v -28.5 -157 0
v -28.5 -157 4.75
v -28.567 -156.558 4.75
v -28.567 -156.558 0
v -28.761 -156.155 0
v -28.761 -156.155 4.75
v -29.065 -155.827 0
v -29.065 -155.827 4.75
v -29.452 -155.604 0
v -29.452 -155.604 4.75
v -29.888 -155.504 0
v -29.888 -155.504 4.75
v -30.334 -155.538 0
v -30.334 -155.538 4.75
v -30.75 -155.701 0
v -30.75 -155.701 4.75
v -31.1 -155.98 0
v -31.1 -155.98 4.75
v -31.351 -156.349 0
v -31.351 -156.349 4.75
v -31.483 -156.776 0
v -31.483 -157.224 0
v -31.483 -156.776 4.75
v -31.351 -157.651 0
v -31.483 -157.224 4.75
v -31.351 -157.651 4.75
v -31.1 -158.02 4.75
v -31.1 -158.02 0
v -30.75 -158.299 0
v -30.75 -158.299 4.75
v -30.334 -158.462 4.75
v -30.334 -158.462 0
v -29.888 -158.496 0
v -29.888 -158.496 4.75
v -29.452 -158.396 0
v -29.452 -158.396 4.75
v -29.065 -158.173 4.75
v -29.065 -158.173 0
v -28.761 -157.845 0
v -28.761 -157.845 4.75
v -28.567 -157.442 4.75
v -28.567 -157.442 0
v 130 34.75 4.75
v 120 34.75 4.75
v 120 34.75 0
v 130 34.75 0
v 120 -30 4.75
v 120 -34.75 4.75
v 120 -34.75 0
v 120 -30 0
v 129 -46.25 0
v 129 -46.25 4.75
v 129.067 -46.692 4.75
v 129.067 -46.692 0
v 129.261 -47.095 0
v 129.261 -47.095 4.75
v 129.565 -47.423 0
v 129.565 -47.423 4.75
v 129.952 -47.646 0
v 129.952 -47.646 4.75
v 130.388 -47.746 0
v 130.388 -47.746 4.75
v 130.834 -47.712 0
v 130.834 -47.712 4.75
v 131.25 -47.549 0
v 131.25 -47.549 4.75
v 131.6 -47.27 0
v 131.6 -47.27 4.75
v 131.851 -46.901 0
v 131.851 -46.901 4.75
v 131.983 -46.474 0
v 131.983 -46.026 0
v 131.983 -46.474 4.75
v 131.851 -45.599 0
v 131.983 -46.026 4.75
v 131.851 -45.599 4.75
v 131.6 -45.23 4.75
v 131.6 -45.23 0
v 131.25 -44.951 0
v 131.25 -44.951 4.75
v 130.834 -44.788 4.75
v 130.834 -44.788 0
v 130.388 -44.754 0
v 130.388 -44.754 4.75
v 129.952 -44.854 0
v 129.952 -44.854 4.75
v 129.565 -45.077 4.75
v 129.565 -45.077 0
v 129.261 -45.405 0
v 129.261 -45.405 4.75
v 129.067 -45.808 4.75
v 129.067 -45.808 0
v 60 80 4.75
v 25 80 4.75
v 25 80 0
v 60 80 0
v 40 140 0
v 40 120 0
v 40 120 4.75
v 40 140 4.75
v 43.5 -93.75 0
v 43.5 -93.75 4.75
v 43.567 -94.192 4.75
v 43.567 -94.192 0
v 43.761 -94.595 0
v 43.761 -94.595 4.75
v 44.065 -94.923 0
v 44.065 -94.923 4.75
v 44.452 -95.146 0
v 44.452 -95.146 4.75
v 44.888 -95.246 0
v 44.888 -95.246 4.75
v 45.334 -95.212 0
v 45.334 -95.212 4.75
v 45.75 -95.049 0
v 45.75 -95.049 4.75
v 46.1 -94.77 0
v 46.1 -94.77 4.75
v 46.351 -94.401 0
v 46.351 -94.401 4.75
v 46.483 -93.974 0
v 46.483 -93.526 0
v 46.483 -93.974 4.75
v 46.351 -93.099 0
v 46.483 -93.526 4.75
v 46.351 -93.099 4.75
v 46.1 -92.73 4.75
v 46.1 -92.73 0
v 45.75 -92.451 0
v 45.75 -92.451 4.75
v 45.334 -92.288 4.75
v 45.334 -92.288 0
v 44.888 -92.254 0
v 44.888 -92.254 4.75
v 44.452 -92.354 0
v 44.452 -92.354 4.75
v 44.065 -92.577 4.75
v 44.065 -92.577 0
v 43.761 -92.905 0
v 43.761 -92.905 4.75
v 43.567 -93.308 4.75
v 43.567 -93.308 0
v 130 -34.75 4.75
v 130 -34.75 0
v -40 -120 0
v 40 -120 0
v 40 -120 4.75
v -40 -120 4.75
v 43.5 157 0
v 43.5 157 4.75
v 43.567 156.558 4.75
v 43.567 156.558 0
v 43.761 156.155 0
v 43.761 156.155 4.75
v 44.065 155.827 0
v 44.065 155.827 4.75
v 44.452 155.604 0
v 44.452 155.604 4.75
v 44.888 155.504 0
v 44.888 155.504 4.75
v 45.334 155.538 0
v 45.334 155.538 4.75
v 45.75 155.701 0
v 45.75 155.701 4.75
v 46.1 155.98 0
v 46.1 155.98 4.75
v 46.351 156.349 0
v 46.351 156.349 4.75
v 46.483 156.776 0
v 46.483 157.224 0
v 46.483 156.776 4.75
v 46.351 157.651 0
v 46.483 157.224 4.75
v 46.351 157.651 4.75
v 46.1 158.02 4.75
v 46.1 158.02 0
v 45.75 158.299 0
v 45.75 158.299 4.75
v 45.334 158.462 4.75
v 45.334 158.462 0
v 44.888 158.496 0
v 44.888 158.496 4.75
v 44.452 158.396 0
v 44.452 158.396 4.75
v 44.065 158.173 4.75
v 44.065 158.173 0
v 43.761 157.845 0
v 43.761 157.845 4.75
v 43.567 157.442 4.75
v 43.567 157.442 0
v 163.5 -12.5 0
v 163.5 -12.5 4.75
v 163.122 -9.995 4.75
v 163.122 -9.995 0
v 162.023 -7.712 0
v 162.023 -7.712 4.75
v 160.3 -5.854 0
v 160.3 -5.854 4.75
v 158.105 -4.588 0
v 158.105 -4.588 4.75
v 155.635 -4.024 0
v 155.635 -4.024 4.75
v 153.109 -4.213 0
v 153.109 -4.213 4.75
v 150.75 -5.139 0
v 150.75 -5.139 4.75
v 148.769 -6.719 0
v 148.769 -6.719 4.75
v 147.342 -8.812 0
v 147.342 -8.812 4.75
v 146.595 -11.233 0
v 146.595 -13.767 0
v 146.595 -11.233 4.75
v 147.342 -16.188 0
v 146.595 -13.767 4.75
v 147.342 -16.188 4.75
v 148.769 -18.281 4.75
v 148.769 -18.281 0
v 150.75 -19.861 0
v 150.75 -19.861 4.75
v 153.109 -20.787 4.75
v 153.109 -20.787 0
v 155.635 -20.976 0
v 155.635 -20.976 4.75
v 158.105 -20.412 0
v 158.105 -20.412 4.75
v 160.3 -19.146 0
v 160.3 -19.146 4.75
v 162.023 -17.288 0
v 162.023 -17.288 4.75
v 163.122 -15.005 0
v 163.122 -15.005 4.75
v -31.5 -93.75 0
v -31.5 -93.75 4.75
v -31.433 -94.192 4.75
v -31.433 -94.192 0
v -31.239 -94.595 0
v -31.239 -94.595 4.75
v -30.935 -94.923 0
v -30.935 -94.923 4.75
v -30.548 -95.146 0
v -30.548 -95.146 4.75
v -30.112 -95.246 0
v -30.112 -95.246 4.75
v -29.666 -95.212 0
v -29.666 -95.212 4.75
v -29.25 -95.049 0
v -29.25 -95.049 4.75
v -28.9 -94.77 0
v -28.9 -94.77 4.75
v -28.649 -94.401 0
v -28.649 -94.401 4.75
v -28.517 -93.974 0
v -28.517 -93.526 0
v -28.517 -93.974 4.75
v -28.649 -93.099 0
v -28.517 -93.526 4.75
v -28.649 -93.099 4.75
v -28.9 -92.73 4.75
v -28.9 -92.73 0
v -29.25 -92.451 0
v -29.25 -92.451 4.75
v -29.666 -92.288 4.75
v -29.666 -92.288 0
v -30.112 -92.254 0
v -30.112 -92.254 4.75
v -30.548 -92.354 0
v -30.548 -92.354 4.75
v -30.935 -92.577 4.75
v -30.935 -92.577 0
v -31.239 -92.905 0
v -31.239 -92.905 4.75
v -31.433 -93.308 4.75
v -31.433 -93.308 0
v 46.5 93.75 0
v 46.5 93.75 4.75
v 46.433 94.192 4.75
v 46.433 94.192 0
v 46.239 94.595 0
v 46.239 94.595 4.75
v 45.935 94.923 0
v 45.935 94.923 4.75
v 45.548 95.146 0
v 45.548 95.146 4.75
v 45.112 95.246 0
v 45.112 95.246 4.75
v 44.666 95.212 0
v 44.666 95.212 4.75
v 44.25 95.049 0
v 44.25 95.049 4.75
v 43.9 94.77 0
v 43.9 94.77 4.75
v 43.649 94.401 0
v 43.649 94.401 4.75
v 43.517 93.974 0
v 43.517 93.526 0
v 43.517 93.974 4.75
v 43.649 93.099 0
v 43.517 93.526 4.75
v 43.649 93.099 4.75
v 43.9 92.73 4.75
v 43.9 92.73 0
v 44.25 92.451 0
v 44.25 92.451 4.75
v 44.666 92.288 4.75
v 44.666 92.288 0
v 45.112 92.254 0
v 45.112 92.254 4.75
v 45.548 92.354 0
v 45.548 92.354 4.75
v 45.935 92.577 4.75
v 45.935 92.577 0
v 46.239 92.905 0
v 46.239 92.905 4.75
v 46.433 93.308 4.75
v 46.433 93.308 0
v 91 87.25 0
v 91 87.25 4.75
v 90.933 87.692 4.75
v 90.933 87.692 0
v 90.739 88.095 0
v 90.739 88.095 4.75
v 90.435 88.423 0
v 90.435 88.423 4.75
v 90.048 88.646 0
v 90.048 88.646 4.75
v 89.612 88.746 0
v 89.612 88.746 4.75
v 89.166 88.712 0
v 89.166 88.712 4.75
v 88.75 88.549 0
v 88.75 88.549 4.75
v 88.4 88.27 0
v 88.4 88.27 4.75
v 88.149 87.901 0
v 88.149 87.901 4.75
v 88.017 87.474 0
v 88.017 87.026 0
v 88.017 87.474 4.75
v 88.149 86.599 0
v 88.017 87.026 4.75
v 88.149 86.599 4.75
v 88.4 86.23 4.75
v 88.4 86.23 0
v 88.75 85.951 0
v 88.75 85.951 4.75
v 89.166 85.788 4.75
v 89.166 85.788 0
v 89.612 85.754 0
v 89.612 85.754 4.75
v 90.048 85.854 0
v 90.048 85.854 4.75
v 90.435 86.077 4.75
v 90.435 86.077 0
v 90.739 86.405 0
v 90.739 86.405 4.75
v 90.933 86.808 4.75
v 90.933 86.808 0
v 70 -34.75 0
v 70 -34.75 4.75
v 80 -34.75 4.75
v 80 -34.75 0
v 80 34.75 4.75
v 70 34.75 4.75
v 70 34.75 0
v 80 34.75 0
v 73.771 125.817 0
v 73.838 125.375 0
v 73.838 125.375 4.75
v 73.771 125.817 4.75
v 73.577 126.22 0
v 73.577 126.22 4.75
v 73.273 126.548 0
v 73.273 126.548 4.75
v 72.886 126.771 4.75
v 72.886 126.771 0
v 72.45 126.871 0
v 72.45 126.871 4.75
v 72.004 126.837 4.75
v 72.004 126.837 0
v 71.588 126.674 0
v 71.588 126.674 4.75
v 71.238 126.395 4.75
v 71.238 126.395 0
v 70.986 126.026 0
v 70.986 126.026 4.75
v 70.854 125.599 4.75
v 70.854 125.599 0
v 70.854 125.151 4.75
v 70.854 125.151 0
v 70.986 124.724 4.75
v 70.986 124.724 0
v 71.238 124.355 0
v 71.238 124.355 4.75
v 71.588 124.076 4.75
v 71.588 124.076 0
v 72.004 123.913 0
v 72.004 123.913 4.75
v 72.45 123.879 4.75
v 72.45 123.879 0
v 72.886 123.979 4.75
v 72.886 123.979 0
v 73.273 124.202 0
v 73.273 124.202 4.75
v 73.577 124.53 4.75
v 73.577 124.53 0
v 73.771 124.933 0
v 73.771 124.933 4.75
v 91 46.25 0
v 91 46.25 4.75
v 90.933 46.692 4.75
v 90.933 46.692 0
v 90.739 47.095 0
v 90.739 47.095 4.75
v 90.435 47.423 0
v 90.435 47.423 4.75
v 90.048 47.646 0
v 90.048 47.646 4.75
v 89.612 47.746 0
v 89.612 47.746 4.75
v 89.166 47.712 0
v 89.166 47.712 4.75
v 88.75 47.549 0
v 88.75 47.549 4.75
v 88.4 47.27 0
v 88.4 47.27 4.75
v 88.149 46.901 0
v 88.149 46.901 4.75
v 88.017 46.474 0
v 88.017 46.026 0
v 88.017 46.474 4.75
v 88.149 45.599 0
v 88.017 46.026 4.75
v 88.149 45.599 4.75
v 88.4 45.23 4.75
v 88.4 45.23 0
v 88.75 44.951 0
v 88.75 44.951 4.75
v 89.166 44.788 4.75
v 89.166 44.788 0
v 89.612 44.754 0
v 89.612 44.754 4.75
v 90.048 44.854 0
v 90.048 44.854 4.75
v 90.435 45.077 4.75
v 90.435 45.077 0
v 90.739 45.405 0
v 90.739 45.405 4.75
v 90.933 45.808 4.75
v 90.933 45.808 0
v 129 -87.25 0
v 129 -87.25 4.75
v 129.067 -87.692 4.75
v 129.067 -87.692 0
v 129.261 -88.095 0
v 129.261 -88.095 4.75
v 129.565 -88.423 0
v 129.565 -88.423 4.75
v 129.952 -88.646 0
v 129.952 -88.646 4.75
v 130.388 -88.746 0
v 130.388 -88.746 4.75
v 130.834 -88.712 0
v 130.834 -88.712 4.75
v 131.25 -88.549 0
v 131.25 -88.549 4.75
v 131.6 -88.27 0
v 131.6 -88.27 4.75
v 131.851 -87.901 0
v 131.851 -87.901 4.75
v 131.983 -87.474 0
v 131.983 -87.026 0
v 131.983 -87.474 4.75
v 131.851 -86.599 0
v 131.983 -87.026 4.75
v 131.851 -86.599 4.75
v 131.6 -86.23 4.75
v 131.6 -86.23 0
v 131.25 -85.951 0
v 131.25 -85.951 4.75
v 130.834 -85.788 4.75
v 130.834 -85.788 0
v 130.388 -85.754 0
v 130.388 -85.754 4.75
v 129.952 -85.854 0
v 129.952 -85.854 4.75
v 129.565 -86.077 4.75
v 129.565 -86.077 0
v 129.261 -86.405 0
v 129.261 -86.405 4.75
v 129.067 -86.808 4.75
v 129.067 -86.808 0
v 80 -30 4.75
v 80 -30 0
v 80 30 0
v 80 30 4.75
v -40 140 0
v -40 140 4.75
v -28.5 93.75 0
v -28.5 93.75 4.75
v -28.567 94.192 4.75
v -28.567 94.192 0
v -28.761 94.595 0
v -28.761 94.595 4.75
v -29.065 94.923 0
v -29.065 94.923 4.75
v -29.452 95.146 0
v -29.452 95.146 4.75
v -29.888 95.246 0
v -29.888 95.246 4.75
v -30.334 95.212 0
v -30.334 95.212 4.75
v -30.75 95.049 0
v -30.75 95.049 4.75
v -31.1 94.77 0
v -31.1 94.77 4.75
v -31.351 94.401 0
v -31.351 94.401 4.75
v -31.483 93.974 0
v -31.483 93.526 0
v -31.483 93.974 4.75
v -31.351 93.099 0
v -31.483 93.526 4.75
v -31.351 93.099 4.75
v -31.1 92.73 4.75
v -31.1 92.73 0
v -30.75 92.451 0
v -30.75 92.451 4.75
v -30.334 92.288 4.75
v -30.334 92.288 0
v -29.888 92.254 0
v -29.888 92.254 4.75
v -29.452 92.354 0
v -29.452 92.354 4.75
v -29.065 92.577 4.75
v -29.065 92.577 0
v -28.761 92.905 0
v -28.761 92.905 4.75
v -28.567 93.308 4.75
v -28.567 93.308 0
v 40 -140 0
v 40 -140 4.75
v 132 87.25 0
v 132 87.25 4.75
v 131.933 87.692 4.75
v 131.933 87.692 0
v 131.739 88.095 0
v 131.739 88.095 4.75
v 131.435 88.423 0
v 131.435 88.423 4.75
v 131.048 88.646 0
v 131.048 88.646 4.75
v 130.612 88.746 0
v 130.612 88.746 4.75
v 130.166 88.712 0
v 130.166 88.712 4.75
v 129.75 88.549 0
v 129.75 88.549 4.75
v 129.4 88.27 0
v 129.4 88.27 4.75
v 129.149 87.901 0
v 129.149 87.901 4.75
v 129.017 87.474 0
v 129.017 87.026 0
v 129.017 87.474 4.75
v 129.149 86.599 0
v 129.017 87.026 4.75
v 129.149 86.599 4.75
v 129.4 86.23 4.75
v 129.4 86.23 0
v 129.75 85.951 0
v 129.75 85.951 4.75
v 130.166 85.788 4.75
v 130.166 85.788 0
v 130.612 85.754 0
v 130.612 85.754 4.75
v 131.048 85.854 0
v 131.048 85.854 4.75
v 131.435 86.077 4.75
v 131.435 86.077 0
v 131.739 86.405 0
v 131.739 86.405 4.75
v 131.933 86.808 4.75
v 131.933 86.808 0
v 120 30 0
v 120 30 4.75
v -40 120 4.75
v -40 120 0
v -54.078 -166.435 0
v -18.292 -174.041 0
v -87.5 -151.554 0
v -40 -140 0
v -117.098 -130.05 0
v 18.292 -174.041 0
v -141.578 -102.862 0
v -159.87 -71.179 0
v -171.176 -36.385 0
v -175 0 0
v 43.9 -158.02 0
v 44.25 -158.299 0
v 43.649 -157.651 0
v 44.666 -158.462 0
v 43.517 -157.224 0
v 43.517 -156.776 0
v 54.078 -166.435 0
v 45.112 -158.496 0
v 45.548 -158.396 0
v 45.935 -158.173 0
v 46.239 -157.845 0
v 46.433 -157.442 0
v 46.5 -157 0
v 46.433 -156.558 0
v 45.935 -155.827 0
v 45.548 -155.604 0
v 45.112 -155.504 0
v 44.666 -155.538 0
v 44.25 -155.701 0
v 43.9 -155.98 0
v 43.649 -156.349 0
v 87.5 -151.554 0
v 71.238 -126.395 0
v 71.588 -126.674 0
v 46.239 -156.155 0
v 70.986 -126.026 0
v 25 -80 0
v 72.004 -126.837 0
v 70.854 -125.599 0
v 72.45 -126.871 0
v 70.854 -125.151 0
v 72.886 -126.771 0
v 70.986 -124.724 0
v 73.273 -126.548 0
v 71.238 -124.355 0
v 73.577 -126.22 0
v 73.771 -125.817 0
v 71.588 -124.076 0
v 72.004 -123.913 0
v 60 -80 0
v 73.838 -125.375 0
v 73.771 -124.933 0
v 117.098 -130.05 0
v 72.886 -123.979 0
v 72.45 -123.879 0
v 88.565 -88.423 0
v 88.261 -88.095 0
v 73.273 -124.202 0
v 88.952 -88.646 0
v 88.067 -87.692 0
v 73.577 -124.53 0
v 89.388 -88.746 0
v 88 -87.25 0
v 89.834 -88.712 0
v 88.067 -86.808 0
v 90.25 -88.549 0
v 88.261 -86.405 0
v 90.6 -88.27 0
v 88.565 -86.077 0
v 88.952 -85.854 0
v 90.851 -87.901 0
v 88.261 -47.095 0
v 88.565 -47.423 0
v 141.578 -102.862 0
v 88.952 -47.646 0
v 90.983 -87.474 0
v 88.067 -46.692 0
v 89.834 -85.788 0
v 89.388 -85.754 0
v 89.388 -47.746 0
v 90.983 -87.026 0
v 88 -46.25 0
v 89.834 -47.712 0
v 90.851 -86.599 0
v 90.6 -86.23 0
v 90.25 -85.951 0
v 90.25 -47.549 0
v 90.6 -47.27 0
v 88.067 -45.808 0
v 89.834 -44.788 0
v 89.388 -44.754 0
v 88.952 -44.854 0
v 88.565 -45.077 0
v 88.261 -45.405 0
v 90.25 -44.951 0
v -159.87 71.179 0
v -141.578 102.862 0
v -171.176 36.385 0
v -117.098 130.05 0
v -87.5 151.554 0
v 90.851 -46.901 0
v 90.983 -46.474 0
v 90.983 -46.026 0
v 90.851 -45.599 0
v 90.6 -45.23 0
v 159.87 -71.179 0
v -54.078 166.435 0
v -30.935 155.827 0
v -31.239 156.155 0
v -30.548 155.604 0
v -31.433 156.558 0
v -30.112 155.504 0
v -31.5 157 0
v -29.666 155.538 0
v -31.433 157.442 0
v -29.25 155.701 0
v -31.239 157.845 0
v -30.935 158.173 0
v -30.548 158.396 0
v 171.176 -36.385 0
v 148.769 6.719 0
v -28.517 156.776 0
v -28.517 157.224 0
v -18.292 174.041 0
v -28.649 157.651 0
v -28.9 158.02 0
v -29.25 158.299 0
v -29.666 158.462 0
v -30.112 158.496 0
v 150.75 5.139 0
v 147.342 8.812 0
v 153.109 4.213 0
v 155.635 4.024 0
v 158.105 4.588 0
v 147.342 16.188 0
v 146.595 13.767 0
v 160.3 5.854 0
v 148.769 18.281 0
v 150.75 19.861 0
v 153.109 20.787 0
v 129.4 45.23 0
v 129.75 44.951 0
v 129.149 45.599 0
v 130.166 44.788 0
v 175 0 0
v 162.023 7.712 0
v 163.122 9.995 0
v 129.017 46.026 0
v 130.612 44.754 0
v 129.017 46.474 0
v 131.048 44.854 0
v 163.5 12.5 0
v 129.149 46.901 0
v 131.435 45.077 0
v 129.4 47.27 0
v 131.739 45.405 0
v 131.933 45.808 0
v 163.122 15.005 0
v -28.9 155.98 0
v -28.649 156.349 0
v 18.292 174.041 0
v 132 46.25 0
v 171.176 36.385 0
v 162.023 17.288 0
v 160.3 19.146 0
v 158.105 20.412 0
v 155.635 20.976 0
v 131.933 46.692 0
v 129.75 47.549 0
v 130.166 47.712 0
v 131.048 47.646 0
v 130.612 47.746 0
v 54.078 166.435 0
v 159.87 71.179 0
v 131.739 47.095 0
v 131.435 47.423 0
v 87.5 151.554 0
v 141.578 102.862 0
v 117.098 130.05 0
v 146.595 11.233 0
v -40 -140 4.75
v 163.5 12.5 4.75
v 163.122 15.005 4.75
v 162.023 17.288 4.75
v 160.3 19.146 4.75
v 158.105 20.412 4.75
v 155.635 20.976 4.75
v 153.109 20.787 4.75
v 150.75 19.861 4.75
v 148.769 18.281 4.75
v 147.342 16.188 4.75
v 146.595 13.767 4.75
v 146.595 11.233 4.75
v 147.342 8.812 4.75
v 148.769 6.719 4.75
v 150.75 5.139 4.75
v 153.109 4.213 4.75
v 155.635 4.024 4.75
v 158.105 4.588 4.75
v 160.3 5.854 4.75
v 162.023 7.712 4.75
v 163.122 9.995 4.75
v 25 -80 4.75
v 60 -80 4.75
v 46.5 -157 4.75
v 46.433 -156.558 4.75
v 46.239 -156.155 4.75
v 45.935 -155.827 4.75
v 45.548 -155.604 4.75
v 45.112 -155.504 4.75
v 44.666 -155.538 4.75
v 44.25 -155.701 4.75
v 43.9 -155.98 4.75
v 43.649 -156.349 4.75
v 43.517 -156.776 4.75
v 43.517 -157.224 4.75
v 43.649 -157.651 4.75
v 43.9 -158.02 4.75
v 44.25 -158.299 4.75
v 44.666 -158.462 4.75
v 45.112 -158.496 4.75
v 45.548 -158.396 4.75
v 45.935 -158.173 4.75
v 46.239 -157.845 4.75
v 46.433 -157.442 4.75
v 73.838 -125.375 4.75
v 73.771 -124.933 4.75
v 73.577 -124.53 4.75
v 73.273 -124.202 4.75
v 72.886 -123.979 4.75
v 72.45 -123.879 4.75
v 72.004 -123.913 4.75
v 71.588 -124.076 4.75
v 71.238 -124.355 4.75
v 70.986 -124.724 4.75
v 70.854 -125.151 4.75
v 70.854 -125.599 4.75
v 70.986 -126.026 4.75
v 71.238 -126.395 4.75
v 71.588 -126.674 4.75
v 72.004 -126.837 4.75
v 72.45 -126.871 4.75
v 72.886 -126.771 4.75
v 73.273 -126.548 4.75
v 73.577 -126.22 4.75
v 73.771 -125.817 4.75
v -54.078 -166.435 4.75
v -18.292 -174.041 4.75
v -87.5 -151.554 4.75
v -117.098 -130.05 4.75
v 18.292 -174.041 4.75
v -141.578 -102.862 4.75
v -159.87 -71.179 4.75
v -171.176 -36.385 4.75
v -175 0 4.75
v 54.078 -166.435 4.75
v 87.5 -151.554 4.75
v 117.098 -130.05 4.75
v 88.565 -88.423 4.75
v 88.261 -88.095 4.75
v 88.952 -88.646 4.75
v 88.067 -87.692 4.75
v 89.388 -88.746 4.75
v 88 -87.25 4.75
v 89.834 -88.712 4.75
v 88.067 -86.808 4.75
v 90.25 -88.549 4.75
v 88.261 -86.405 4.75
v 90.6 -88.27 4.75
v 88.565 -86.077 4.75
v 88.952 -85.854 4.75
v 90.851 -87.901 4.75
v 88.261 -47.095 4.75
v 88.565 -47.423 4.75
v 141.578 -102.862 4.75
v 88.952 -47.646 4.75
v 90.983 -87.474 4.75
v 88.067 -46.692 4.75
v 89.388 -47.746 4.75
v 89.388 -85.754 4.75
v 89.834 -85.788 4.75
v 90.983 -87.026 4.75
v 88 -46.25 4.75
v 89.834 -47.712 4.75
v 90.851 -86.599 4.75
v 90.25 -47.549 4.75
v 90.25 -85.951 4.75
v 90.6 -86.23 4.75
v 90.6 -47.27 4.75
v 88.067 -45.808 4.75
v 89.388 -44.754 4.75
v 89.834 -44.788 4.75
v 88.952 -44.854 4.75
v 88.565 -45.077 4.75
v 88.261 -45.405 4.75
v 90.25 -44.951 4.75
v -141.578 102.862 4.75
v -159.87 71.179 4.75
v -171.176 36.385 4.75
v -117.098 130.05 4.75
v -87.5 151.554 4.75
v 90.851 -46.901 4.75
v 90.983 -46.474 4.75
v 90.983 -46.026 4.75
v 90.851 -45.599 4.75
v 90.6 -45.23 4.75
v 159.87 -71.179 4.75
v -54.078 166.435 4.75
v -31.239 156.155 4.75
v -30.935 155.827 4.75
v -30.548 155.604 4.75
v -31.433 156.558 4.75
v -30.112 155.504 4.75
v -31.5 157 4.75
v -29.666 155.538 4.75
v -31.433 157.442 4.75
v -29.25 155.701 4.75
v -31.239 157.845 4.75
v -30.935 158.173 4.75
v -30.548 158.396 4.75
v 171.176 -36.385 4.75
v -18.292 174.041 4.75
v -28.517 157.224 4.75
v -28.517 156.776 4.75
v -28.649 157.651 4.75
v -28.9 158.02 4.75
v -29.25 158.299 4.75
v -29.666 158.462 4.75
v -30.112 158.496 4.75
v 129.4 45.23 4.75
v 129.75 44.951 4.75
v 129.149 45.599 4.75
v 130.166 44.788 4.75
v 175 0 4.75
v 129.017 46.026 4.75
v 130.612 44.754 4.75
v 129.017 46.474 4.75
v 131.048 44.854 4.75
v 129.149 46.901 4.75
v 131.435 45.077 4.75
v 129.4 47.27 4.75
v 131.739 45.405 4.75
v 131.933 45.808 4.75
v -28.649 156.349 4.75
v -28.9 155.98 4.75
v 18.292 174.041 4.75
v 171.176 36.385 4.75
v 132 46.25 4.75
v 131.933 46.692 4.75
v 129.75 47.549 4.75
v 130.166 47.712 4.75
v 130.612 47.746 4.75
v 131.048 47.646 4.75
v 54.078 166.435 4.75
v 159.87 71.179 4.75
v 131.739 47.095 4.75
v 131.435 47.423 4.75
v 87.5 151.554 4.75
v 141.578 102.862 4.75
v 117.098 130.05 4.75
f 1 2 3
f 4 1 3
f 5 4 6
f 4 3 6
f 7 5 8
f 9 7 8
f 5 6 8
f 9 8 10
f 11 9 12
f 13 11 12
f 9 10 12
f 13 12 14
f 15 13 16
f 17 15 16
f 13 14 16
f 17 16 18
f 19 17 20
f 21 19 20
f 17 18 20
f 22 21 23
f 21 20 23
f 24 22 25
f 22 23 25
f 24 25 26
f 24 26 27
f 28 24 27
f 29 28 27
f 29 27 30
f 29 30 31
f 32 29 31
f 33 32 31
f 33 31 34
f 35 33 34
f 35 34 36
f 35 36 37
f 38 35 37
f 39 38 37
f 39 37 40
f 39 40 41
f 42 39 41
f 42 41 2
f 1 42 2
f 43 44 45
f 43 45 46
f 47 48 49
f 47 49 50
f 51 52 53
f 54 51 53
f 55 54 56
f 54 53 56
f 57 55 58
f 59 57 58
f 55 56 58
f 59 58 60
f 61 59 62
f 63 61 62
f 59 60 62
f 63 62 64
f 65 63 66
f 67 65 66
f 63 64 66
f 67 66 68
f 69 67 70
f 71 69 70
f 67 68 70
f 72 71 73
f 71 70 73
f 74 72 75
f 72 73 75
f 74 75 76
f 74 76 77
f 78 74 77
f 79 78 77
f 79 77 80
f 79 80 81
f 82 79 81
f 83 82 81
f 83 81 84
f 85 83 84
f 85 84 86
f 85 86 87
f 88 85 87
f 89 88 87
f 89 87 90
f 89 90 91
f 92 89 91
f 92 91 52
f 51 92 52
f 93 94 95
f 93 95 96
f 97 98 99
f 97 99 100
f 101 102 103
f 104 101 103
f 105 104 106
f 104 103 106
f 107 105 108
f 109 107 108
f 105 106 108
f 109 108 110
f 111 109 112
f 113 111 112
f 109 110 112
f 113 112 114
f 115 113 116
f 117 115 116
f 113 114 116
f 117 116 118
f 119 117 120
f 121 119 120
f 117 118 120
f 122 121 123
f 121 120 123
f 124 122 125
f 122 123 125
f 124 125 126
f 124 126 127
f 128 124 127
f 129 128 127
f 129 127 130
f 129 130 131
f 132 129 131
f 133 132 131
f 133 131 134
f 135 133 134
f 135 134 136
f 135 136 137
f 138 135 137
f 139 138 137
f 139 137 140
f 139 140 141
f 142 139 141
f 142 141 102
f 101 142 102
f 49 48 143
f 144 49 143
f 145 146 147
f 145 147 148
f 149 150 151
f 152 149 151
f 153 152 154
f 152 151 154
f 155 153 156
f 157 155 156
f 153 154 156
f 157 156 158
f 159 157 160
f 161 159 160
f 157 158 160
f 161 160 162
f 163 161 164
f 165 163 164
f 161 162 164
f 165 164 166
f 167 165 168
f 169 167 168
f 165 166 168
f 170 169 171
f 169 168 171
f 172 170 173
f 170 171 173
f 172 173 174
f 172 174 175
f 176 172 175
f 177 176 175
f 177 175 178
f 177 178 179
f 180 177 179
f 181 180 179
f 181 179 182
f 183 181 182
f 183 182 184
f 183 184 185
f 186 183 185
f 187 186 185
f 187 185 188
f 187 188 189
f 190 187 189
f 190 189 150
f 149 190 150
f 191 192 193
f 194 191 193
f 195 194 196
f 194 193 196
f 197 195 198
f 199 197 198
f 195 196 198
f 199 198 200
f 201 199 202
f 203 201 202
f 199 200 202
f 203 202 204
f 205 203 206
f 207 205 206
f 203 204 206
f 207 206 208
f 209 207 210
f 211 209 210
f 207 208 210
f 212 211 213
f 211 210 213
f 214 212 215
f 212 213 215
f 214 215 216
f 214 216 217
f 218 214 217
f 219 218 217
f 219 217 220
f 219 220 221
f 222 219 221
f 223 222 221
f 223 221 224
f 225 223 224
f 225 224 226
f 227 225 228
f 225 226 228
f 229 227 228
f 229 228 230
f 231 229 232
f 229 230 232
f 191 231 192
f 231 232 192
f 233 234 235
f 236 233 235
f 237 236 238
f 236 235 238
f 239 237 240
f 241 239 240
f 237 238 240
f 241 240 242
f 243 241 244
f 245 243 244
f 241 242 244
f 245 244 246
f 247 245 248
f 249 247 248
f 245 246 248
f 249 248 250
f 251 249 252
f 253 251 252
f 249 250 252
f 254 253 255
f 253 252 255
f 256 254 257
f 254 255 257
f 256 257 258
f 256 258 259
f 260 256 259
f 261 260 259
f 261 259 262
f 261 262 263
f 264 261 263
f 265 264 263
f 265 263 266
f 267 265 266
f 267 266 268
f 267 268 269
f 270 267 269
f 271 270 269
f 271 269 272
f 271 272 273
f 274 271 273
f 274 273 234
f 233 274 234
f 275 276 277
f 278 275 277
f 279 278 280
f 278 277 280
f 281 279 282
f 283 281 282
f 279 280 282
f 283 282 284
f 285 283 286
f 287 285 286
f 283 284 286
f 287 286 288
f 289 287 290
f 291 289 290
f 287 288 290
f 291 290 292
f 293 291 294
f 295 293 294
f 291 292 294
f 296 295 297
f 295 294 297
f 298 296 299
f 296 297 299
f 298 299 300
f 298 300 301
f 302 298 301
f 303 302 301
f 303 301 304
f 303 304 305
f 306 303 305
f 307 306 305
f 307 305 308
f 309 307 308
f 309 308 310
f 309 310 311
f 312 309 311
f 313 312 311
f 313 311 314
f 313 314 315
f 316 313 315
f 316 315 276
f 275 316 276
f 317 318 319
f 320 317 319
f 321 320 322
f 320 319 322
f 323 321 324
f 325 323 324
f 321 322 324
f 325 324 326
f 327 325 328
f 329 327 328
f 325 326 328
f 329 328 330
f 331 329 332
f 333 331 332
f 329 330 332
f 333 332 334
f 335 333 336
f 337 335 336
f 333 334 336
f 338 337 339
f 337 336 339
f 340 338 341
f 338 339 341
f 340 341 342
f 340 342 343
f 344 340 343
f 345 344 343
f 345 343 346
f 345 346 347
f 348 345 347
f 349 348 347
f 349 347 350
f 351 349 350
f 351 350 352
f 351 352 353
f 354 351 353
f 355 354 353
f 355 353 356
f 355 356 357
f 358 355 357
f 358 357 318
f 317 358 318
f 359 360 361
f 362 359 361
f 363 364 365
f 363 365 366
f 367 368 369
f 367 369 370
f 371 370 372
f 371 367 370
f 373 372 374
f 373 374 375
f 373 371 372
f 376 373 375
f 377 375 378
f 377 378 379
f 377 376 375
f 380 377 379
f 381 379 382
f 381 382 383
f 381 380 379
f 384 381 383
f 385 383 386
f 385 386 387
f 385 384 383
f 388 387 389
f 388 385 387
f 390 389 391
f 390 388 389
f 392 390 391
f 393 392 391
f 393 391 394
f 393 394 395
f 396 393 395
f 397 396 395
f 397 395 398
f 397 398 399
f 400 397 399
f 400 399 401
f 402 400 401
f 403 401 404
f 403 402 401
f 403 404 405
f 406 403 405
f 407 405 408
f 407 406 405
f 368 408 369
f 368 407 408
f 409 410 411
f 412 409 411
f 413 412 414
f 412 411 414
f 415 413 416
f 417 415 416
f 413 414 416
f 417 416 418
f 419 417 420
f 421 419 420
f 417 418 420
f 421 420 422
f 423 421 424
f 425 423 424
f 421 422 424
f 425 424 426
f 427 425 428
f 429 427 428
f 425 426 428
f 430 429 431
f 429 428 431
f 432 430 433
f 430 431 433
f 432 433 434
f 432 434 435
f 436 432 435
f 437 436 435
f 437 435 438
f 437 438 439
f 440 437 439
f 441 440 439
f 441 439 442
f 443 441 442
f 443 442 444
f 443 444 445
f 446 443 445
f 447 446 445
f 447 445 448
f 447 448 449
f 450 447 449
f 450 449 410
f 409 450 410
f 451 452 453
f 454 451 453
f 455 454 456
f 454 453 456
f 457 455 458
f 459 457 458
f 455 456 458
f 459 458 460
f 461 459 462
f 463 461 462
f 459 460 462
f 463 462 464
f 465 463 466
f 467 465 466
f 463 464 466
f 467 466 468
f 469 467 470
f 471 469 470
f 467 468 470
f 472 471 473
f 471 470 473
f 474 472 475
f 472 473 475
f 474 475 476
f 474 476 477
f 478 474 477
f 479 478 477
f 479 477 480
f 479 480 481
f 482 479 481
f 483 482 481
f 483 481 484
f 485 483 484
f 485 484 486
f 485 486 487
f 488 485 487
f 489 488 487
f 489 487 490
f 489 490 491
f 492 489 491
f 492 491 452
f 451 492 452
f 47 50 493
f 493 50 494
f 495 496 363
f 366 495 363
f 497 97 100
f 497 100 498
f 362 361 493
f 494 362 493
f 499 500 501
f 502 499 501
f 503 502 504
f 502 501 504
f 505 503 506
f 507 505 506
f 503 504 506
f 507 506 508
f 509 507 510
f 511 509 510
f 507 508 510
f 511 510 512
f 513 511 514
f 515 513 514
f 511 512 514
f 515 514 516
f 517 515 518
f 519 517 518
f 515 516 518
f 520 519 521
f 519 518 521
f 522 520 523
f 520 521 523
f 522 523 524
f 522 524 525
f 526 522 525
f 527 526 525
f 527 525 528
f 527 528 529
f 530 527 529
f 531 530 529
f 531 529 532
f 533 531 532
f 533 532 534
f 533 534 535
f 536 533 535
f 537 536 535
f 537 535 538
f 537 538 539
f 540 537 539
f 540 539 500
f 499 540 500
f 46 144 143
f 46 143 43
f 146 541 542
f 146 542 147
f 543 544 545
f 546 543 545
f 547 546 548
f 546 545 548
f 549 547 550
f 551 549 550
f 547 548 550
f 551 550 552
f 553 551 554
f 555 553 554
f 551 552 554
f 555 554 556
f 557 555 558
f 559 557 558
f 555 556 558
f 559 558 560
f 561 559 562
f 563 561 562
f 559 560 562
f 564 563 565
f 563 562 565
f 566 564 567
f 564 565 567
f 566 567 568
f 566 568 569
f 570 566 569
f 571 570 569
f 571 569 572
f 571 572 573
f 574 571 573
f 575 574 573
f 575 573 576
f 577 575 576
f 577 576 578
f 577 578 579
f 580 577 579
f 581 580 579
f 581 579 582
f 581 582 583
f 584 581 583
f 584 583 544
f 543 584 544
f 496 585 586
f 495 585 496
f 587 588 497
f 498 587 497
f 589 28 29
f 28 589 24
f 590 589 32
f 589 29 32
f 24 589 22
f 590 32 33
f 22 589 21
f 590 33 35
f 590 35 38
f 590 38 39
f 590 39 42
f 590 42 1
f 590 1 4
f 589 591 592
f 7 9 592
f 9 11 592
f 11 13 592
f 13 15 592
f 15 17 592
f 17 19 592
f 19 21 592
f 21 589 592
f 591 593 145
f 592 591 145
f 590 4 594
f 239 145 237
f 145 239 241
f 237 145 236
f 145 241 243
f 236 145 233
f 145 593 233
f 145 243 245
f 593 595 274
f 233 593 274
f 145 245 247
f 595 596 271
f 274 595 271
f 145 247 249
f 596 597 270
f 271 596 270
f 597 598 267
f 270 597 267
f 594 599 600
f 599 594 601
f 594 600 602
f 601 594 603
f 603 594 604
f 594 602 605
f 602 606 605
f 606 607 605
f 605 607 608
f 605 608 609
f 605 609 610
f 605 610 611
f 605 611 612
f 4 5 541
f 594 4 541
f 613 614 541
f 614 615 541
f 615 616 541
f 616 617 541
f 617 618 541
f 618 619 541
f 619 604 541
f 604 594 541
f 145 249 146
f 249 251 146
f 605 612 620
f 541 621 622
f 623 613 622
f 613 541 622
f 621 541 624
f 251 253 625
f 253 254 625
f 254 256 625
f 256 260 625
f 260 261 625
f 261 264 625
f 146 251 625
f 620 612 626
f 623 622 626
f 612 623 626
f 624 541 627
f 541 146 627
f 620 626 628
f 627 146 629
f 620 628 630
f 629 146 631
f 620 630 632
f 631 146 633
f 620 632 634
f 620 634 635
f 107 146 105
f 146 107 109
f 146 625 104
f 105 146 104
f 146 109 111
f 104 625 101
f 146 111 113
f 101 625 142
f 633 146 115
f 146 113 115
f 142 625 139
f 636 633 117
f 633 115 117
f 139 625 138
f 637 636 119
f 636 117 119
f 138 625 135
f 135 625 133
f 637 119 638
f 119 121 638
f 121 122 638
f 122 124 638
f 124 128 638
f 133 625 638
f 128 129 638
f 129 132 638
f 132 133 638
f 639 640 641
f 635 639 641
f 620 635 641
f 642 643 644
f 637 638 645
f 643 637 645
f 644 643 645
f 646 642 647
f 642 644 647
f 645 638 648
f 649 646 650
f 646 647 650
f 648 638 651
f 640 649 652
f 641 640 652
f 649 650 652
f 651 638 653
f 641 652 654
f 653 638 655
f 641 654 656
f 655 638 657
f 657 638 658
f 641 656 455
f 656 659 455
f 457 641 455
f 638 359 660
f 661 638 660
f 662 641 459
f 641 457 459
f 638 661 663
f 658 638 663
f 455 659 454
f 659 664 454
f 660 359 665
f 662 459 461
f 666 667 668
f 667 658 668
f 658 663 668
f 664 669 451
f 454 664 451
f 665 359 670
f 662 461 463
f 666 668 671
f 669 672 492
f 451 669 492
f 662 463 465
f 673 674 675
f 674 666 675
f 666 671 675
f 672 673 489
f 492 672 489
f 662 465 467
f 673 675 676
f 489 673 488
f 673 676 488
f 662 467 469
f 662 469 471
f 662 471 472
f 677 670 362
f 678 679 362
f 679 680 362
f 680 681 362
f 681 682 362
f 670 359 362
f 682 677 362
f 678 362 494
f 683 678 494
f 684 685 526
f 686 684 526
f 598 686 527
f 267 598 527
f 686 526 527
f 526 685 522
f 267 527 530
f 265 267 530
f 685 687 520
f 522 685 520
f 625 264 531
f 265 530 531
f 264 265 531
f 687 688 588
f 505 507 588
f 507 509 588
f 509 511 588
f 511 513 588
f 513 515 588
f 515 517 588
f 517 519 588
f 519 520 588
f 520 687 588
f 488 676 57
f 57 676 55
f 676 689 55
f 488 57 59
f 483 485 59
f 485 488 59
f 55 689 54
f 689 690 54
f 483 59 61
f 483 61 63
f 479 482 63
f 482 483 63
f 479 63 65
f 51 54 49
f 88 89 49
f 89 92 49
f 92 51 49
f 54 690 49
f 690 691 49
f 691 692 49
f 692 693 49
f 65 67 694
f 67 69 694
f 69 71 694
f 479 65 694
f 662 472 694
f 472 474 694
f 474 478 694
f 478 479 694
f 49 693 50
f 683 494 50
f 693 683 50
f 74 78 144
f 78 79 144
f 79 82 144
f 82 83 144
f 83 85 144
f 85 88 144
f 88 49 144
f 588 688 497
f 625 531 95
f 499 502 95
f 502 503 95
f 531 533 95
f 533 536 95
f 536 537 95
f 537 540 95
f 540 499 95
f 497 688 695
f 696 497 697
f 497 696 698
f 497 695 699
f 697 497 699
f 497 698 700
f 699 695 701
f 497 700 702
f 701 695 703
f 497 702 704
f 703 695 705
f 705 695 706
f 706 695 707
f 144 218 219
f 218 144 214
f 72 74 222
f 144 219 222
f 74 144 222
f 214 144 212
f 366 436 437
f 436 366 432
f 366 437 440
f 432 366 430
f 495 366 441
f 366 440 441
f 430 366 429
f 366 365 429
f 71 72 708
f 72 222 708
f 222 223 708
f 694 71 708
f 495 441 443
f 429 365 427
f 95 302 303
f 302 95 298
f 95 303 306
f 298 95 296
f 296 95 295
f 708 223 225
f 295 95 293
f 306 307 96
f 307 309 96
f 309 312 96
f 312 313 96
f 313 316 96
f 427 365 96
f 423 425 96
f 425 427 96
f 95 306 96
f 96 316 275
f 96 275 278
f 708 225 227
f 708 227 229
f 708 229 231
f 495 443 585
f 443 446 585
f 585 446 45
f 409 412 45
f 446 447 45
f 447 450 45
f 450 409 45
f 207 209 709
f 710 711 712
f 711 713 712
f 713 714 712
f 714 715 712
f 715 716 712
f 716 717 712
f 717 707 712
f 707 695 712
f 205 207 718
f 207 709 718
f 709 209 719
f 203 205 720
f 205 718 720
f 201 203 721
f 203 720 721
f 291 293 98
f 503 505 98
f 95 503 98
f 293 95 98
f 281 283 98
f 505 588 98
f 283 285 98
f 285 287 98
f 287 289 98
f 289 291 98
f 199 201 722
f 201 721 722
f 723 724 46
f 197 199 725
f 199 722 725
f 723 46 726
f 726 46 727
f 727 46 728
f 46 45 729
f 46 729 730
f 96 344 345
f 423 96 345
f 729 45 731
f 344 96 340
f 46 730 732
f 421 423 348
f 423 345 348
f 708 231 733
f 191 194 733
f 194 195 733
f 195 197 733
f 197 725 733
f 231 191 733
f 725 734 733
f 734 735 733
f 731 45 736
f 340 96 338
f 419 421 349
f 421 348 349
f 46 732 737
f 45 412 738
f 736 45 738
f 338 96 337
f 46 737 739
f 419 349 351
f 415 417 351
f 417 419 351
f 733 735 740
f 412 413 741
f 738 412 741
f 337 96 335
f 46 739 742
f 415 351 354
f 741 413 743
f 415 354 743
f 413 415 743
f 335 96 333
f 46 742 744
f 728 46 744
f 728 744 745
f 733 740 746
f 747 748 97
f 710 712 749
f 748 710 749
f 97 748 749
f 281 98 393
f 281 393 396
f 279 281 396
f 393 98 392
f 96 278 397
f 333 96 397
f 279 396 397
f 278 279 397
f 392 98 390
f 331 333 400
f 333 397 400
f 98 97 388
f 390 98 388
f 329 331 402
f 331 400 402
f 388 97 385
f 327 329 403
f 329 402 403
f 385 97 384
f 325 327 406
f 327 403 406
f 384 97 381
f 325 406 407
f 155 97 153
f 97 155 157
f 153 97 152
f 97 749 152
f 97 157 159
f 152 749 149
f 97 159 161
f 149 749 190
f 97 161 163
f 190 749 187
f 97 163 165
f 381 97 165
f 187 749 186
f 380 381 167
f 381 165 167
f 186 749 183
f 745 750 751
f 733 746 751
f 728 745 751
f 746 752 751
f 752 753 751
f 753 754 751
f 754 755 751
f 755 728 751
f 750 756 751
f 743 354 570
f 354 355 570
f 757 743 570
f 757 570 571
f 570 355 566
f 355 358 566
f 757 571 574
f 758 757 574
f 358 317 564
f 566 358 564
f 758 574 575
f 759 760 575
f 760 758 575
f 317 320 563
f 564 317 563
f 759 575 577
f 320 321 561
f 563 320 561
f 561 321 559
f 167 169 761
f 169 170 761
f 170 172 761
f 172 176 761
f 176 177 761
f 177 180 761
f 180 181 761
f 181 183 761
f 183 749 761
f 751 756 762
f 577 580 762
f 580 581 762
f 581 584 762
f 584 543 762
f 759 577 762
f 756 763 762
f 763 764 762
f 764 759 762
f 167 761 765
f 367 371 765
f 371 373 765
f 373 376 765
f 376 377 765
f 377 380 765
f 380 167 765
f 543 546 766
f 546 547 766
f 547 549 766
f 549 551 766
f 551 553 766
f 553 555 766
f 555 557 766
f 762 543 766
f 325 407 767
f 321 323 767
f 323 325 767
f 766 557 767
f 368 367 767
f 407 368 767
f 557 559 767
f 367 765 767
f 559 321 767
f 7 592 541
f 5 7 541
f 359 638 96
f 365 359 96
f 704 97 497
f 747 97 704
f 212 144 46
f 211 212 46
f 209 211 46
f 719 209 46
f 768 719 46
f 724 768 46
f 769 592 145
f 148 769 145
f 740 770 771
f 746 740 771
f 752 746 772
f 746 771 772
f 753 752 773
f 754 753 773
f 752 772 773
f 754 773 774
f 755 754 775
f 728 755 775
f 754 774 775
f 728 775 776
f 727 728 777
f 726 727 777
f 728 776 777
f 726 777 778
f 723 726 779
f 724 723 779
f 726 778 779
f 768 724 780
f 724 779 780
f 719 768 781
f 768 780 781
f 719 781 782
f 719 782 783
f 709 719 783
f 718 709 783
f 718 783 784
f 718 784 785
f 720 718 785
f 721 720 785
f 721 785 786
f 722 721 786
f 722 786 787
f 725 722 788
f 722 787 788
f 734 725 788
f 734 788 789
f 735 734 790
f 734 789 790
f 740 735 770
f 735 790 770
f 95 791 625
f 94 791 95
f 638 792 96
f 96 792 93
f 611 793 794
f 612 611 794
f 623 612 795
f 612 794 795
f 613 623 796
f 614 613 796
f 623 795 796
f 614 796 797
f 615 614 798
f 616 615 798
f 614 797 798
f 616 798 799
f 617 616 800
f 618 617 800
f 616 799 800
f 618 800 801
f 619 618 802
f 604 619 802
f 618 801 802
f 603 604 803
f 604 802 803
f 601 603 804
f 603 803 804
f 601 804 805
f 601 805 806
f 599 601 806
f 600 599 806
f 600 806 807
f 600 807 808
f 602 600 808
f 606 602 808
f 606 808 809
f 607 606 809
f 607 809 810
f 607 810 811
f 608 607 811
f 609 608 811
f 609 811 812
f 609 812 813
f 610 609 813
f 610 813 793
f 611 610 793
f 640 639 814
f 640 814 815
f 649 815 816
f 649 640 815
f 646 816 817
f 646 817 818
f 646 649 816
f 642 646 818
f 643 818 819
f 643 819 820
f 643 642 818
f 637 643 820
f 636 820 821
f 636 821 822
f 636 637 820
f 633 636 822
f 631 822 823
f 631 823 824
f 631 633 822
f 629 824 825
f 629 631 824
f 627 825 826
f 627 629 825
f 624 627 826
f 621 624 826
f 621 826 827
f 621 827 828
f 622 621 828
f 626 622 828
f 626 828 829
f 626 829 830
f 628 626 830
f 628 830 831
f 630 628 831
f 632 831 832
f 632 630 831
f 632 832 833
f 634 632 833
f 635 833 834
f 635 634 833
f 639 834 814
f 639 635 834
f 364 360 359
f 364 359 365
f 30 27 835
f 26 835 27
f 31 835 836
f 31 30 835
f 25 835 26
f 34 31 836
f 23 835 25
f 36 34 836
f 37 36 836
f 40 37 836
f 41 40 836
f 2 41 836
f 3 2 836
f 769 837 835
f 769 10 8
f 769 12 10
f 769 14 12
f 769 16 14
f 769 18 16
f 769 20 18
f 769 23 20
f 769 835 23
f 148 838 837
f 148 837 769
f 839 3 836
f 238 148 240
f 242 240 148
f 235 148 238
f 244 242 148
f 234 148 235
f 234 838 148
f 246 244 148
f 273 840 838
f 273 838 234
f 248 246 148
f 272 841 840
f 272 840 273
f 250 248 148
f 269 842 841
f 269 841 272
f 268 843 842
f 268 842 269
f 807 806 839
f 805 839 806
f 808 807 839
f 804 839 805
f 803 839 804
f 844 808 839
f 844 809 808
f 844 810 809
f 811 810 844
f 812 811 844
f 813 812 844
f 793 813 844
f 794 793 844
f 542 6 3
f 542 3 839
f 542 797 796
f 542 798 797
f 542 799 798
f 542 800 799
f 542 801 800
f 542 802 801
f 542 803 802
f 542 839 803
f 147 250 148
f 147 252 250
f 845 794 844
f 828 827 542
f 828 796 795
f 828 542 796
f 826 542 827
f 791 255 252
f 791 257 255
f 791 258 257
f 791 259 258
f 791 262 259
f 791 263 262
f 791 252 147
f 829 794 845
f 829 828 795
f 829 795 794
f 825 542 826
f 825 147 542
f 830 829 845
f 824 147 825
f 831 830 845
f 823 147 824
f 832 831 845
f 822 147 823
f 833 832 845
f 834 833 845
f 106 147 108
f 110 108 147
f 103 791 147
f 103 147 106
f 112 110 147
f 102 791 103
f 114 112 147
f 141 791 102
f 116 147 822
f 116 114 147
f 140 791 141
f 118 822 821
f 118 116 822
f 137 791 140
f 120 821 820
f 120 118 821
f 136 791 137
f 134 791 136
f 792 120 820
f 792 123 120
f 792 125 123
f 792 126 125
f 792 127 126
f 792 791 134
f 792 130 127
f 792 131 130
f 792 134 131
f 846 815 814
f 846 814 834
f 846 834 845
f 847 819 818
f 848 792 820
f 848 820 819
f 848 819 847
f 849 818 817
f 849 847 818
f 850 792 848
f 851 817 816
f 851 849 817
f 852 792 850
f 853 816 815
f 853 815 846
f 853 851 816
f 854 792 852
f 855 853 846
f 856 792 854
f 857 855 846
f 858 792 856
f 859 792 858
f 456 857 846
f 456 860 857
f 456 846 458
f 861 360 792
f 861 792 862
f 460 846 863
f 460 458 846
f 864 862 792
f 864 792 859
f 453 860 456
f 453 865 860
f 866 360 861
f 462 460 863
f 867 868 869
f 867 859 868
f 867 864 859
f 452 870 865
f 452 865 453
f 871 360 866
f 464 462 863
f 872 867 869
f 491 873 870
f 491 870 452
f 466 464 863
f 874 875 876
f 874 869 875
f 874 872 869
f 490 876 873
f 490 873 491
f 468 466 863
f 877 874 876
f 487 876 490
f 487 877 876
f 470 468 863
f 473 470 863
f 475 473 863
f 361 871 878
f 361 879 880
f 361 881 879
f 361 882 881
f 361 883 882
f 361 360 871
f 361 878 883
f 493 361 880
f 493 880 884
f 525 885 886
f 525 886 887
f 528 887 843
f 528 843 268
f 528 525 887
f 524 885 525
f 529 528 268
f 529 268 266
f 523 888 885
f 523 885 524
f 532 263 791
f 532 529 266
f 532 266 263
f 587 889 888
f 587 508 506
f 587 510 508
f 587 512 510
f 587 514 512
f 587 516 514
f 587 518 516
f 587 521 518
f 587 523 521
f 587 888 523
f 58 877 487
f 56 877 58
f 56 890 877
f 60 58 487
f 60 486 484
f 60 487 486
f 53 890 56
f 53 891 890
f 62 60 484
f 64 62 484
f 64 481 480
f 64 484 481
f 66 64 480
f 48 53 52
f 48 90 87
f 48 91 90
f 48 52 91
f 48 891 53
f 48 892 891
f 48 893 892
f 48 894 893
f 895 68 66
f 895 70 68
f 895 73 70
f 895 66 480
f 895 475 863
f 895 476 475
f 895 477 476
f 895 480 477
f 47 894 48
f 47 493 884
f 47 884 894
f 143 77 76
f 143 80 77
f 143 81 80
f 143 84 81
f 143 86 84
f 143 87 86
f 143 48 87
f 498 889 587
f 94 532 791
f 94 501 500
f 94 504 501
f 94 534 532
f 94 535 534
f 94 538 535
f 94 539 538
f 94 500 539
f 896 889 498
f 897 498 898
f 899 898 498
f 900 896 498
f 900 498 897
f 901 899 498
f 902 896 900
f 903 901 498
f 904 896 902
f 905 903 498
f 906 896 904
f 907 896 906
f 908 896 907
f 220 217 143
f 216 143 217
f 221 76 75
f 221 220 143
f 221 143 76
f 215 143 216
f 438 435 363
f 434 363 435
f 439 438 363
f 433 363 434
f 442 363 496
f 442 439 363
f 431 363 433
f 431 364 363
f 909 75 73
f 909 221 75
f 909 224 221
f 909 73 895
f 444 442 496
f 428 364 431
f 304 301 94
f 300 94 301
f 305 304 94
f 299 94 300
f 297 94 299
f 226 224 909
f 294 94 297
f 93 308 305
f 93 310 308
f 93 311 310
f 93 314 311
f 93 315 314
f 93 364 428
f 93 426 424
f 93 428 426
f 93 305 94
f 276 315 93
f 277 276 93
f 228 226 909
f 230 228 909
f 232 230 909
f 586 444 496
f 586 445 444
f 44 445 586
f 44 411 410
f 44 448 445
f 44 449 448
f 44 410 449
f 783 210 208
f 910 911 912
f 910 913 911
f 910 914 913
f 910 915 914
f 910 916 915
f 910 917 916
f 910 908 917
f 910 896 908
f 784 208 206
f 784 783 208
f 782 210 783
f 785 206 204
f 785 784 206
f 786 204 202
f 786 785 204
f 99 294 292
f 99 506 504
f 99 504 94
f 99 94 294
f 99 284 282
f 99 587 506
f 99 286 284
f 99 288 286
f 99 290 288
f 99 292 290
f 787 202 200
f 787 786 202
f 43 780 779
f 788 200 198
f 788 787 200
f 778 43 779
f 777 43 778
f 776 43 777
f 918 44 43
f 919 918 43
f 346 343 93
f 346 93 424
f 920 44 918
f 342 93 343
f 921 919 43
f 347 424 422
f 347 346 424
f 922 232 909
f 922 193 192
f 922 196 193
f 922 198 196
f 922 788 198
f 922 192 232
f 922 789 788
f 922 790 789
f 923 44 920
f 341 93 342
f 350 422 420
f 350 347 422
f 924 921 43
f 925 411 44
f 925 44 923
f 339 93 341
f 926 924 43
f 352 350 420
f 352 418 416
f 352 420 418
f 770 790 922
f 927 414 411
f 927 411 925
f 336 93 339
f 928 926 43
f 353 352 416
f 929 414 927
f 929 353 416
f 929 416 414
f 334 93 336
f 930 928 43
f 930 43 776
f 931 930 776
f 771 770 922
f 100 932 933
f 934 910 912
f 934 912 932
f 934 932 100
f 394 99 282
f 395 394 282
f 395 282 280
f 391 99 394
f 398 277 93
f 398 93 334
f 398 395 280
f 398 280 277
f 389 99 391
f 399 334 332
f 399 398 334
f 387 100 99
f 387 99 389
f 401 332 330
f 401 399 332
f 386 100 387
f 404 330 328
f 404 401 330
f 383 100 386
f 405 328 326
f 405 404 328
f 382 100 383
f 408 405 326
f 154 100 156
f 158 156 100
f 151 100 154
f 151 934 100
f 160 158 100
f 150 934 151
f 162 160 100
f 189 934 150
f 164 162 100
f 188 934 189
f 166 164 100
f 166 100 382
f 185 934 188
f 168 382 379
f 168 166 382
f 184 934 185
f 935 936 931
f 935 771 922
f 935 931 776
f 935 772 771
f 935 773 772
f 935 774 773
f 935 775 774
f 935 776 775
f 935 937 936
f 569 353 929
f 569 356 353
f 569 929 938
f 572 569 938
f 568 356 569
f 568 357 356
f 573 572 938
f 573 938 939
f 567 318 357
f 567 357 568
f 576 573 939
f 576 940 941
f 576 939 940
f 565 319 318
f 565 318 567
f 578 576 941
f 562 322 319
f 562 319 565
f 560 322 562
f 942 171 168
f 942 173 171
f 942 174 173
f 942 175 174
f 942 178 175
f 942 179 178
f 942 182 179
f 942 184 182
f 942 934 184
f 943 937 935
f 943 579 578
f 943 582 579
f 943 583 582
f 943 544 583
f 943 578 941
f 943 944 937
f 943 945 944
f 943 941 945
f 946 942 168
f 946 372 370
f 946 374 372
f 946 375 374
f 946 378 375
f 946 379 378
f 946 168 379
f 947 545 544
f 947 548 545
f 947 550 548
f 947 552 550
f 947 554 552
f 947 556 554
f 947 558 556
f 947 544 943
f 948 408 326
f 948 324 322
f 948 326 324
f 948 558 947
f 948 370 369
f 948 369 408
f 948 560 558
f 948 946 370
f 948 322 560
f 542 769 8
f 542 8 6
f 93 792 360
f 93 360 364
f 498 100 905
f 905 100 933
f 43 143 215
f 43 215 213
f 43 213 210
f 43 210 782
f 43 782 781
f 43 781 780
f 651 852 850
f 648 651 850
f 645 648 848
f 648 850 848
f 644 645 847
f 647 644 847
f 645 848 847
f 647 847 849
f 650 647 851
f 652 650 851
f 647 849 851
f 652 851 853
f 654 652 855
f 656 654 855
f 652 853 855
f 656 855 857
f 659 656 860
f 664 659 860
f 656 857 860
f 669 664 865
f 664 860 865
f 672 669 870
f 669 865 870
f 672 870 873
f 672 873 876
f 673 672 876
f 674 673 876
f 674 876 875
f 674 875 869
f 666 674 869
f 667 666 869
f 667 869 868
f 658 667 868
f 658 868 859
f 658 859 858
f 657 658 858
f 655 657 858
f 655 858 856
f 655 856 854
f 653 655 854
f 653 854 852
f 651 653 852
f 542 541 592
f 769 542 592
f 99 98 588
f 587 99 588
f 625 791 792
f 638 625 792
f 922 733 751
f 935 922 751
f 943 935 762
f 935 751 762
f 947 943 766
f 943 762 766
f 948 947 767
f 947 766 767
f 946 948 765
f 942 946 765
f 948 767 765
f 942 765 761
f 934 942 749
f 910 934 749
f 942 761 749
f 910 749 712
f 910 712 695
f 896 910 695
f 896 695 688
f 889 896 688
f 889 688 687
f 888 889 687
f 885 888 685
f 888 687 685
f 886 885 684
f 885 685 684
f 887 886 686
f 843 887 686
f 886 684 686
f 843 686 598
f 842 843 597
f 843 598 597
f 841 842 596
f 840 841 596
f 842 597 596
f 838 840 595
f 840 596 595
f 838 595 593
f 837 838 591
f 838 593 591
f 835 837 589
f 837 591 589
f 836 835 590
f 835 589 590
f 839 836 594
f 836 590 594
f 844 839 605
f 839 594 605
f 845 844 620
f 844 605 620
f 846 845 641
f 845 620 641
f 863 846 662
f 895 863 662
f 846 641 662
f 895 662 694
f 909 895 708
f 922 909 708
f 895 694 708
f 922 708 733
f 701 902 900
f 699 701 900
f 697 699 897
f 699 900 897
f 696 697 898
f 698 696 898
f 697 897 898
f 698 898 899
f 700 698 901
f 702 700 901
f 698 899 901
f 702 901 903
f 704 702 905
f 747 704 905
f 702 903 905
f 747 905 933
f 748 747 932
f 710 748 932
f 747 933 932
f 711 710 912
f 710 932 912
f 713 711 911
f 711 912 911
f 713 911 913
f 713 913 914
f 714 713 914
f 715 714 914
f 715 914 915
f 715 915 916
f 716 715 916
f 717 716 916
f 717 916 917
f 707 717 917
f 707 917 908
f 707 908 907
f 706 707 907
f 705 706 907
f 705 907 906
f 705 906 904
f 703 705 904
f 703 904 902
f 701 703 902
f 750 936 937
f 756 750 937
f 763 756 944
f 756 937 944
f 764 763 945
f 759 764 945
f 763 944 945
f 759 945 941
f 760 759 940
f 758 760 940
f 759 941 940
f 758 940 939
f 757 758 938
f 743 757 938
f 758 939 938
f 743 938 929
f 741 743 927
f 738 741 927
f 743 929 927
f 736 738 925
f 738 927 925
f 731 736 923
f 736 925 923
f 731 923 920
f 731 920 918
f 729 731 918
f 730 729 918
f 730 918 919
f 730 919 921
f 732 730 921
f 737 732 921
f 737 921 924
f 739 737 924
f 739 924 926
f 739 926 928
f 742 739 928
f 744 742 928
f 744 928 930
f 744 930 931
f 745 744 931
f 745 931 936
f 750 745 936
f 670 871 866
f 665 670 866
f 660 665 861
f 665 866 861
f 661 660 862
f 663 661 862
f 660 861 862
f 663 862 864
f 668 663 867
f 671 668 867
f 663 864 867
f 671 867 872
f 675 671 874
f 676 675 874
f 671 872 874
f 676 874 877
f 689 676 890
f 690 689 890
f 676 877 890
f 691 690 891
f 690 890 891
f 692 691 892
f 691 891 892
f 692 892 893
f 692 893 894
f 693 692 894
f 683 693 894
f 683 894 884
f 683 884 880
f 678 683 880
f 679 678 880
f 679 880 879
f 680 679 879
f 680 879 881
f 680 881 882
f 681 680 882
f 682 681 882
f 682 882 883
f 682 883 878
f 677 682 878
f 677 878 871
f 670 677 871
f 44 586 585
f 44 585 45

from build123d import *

# Parameters (mm, degrees)
SKETCH1_R           = 175
BOSS_EXTRUDE1_DEPTH = 4.75
SKETCH2_W           = 80
SKETCH2_H           = 20
SKETCH2_W_2         = 60
SKETCH2_H_2         = 60
CUT_EXTRUDE1_DEPTH  = 4.75
SKETCH3_W           = 10
SKETCH3_H           = 4.75
CUT_EXTRUDE2_DEPTH  = 4.75
SKETCH4_R           = 1.5
CUT_EXTRUDE3_DEPTH  = 248.532952352
SKETCH5_R           = 1.5
CUT_EXTRUDE4_DEPTH  = 248.532952352
SKETCH6_R           = 8.5
CUT_EXTRUDE5_DEPTH  = 4.75
CAVITY1_OUTLINE_R   = 1.5
CAVITY1_DEPTH       = 4.75
SKETCH7_W           = 35
SKETCH7_H           = 160
CUT_EXTRUDE6_DEPTH  = 248.532952352


# Read off the part's stored shape, not the designer's step: Cavity1
with BuildPart() as part:
    # Sketch1 → Boss-Extrude1 (new body)
    with BuildSketch(Plane.XY):
        Circle(SKETCH1_R)
    extrude(amount=BOSS_EXTRUDE1_DEPTH)

    # Sketch2 → Cut-Extrude1 (cut)
    with BuildSketch(Plane(origin=(0, 0, 0), x_dir=(-1, 0, 0), z_dir=(0, 0, -1))):
        with Locations((0, 130)):
            Rectangle(SKETCH2_W, SKETCH2_H)
        with Locations((0, -130)):
            Rectangle(SKETCH2_W, SKETCH2_H)
        with Locations((-100, 0)):
            Rectangle(SKETCH2_W_2, SKETCH2_H_2)
    extrude(amount=-CUT_EXTRUDE1_DEPTH, mode=Mode.SUBTRACT)

    # Sketch3 → Cut-Extrude2 (cut)
    with BuildSketch(Plane.XY.offset(4.75)):
        with Locations((75, 32.375)):
            Rectangle(SKETCH3_W, SKETCH3_H)
        with Locations((125, 32.375)):
            Rectangle(SKETCH3_W, SKETCH3_H)
        with Locations((75, -32.375)):
            Rectangle(SKETCH3_W, SKETCH3_H)
        with Locations((125, -32.375)):
            Rectangle(SKETCH3_W, SKETCH3_H)
    extrude(amount=-CUT_EXTRUDE2_DEPTH, mode=Mode.SUBTRACT)

    # Sketch4 → Cut-Extrude3 (cut, through all)
    with BuildSketch(Plane.XY.offset(4.75)):
        with Locations((-30, -157)):
            Circle(SKETCH4_R)
        with Locations((45, -157)):
            Circle(SKETCH4_R)
        with Locations(Location((-30, 157, 0), (0, 0, 180))):
            Circle(SKETCH4_R)
        with Locations(Location((45, 157, 0), (0, 0, 180))):
            Circle(SKETCH4_R)
        with Locations(Location((45, -93.75, 0), (0, 0, 180))):
            Circle(SKETCH4_R)
        with Locations(Location((-30, -93.75, 0), (0, 0, 180))):
            Circle(SKETCH4_R)
        with Locations((45, 93.75)):
            Circle(SKETCH4_R)
        with Locations((-30, 93.75)):
            Circle(SKETCH4_R)
    extrude(amount=-CUT_EXTRUDE3_DEPTH, mode=Mode.SUBTRACT)

    # Sketch5 → Cut-Extrude4 (cut, through all)
    with BuildSketch(Plane.XY.offset(4.75)):
        with Locations((89.5, 87.25)):
            Circle(SKETCH5_R)
        with Locations((130.5, 87.25)):
            Circle(SKETCH5_R)
        with Locations((130.5, 46.25)):
            Circle(SKETCH5_R)
        with Locations((89.5, 46.25)):
            Circle(SKETCH5_R)
        with Locations(Location((89.5, -87.25, 0), (0, 0, 180))):
            Circle(SKETCH5_R)
        with Locations(Location((130.5, -87.25, 0), (0, 0, 180))):
            Circle(SKETCH5_R)
        with Locations(Location((130.5, -46.25, 0), (0, 0, 180))):
            Circle(SKETCH5_R)
        with Locations(Location((89.5, -46.25, 0), (0, 0, 180))):
            Circle(SKETCH5_R)
    extrude(amount=-CUT_EXTRUDE4_DEPTH, mode=Mode.SUBTRACT)

    # Sketch6 → Cut-Extrude5 (cut)
    with BuildSketch(Plane.XY.offset(4.75)):
        with Locations((155, 12.5)):
            Circle(SKETCH6_R)
        with Locations((155, -12.5)):
            Circle(SKETCH6_R)
    extrude(amount=-CUT_EXTRUDE5_DEPTH, mode=Mode.SUBTRACT)

    # Cavity1 outline → Cavity1 (cut)
    with BuildSketch(Plane.XY):
        with Locations((72.337603572, -125.375)):
            Circle(CAVITY1_OUTLINE_R)
        with Locations((72.337603572, 125.375)):
            Circle(CAVITY1_OUTLINE_R)
    extrude(amount=CAVITY1_DEPTH, mode=Mode.SUBTRACT)

    # Sketch7 → Cut-Extrude6 (cut, through all)
    with BuildSketch(Plane.XY.offset(4.75)):
        with Locations((42.5, 0)):
            Rectangle(SKETCH7_W, SKETCH7_H)
    extrude(amount=-CUT_EXTRUDE6_DEPTH, mode=Mode.SUBTRACT)


solid = part.part
